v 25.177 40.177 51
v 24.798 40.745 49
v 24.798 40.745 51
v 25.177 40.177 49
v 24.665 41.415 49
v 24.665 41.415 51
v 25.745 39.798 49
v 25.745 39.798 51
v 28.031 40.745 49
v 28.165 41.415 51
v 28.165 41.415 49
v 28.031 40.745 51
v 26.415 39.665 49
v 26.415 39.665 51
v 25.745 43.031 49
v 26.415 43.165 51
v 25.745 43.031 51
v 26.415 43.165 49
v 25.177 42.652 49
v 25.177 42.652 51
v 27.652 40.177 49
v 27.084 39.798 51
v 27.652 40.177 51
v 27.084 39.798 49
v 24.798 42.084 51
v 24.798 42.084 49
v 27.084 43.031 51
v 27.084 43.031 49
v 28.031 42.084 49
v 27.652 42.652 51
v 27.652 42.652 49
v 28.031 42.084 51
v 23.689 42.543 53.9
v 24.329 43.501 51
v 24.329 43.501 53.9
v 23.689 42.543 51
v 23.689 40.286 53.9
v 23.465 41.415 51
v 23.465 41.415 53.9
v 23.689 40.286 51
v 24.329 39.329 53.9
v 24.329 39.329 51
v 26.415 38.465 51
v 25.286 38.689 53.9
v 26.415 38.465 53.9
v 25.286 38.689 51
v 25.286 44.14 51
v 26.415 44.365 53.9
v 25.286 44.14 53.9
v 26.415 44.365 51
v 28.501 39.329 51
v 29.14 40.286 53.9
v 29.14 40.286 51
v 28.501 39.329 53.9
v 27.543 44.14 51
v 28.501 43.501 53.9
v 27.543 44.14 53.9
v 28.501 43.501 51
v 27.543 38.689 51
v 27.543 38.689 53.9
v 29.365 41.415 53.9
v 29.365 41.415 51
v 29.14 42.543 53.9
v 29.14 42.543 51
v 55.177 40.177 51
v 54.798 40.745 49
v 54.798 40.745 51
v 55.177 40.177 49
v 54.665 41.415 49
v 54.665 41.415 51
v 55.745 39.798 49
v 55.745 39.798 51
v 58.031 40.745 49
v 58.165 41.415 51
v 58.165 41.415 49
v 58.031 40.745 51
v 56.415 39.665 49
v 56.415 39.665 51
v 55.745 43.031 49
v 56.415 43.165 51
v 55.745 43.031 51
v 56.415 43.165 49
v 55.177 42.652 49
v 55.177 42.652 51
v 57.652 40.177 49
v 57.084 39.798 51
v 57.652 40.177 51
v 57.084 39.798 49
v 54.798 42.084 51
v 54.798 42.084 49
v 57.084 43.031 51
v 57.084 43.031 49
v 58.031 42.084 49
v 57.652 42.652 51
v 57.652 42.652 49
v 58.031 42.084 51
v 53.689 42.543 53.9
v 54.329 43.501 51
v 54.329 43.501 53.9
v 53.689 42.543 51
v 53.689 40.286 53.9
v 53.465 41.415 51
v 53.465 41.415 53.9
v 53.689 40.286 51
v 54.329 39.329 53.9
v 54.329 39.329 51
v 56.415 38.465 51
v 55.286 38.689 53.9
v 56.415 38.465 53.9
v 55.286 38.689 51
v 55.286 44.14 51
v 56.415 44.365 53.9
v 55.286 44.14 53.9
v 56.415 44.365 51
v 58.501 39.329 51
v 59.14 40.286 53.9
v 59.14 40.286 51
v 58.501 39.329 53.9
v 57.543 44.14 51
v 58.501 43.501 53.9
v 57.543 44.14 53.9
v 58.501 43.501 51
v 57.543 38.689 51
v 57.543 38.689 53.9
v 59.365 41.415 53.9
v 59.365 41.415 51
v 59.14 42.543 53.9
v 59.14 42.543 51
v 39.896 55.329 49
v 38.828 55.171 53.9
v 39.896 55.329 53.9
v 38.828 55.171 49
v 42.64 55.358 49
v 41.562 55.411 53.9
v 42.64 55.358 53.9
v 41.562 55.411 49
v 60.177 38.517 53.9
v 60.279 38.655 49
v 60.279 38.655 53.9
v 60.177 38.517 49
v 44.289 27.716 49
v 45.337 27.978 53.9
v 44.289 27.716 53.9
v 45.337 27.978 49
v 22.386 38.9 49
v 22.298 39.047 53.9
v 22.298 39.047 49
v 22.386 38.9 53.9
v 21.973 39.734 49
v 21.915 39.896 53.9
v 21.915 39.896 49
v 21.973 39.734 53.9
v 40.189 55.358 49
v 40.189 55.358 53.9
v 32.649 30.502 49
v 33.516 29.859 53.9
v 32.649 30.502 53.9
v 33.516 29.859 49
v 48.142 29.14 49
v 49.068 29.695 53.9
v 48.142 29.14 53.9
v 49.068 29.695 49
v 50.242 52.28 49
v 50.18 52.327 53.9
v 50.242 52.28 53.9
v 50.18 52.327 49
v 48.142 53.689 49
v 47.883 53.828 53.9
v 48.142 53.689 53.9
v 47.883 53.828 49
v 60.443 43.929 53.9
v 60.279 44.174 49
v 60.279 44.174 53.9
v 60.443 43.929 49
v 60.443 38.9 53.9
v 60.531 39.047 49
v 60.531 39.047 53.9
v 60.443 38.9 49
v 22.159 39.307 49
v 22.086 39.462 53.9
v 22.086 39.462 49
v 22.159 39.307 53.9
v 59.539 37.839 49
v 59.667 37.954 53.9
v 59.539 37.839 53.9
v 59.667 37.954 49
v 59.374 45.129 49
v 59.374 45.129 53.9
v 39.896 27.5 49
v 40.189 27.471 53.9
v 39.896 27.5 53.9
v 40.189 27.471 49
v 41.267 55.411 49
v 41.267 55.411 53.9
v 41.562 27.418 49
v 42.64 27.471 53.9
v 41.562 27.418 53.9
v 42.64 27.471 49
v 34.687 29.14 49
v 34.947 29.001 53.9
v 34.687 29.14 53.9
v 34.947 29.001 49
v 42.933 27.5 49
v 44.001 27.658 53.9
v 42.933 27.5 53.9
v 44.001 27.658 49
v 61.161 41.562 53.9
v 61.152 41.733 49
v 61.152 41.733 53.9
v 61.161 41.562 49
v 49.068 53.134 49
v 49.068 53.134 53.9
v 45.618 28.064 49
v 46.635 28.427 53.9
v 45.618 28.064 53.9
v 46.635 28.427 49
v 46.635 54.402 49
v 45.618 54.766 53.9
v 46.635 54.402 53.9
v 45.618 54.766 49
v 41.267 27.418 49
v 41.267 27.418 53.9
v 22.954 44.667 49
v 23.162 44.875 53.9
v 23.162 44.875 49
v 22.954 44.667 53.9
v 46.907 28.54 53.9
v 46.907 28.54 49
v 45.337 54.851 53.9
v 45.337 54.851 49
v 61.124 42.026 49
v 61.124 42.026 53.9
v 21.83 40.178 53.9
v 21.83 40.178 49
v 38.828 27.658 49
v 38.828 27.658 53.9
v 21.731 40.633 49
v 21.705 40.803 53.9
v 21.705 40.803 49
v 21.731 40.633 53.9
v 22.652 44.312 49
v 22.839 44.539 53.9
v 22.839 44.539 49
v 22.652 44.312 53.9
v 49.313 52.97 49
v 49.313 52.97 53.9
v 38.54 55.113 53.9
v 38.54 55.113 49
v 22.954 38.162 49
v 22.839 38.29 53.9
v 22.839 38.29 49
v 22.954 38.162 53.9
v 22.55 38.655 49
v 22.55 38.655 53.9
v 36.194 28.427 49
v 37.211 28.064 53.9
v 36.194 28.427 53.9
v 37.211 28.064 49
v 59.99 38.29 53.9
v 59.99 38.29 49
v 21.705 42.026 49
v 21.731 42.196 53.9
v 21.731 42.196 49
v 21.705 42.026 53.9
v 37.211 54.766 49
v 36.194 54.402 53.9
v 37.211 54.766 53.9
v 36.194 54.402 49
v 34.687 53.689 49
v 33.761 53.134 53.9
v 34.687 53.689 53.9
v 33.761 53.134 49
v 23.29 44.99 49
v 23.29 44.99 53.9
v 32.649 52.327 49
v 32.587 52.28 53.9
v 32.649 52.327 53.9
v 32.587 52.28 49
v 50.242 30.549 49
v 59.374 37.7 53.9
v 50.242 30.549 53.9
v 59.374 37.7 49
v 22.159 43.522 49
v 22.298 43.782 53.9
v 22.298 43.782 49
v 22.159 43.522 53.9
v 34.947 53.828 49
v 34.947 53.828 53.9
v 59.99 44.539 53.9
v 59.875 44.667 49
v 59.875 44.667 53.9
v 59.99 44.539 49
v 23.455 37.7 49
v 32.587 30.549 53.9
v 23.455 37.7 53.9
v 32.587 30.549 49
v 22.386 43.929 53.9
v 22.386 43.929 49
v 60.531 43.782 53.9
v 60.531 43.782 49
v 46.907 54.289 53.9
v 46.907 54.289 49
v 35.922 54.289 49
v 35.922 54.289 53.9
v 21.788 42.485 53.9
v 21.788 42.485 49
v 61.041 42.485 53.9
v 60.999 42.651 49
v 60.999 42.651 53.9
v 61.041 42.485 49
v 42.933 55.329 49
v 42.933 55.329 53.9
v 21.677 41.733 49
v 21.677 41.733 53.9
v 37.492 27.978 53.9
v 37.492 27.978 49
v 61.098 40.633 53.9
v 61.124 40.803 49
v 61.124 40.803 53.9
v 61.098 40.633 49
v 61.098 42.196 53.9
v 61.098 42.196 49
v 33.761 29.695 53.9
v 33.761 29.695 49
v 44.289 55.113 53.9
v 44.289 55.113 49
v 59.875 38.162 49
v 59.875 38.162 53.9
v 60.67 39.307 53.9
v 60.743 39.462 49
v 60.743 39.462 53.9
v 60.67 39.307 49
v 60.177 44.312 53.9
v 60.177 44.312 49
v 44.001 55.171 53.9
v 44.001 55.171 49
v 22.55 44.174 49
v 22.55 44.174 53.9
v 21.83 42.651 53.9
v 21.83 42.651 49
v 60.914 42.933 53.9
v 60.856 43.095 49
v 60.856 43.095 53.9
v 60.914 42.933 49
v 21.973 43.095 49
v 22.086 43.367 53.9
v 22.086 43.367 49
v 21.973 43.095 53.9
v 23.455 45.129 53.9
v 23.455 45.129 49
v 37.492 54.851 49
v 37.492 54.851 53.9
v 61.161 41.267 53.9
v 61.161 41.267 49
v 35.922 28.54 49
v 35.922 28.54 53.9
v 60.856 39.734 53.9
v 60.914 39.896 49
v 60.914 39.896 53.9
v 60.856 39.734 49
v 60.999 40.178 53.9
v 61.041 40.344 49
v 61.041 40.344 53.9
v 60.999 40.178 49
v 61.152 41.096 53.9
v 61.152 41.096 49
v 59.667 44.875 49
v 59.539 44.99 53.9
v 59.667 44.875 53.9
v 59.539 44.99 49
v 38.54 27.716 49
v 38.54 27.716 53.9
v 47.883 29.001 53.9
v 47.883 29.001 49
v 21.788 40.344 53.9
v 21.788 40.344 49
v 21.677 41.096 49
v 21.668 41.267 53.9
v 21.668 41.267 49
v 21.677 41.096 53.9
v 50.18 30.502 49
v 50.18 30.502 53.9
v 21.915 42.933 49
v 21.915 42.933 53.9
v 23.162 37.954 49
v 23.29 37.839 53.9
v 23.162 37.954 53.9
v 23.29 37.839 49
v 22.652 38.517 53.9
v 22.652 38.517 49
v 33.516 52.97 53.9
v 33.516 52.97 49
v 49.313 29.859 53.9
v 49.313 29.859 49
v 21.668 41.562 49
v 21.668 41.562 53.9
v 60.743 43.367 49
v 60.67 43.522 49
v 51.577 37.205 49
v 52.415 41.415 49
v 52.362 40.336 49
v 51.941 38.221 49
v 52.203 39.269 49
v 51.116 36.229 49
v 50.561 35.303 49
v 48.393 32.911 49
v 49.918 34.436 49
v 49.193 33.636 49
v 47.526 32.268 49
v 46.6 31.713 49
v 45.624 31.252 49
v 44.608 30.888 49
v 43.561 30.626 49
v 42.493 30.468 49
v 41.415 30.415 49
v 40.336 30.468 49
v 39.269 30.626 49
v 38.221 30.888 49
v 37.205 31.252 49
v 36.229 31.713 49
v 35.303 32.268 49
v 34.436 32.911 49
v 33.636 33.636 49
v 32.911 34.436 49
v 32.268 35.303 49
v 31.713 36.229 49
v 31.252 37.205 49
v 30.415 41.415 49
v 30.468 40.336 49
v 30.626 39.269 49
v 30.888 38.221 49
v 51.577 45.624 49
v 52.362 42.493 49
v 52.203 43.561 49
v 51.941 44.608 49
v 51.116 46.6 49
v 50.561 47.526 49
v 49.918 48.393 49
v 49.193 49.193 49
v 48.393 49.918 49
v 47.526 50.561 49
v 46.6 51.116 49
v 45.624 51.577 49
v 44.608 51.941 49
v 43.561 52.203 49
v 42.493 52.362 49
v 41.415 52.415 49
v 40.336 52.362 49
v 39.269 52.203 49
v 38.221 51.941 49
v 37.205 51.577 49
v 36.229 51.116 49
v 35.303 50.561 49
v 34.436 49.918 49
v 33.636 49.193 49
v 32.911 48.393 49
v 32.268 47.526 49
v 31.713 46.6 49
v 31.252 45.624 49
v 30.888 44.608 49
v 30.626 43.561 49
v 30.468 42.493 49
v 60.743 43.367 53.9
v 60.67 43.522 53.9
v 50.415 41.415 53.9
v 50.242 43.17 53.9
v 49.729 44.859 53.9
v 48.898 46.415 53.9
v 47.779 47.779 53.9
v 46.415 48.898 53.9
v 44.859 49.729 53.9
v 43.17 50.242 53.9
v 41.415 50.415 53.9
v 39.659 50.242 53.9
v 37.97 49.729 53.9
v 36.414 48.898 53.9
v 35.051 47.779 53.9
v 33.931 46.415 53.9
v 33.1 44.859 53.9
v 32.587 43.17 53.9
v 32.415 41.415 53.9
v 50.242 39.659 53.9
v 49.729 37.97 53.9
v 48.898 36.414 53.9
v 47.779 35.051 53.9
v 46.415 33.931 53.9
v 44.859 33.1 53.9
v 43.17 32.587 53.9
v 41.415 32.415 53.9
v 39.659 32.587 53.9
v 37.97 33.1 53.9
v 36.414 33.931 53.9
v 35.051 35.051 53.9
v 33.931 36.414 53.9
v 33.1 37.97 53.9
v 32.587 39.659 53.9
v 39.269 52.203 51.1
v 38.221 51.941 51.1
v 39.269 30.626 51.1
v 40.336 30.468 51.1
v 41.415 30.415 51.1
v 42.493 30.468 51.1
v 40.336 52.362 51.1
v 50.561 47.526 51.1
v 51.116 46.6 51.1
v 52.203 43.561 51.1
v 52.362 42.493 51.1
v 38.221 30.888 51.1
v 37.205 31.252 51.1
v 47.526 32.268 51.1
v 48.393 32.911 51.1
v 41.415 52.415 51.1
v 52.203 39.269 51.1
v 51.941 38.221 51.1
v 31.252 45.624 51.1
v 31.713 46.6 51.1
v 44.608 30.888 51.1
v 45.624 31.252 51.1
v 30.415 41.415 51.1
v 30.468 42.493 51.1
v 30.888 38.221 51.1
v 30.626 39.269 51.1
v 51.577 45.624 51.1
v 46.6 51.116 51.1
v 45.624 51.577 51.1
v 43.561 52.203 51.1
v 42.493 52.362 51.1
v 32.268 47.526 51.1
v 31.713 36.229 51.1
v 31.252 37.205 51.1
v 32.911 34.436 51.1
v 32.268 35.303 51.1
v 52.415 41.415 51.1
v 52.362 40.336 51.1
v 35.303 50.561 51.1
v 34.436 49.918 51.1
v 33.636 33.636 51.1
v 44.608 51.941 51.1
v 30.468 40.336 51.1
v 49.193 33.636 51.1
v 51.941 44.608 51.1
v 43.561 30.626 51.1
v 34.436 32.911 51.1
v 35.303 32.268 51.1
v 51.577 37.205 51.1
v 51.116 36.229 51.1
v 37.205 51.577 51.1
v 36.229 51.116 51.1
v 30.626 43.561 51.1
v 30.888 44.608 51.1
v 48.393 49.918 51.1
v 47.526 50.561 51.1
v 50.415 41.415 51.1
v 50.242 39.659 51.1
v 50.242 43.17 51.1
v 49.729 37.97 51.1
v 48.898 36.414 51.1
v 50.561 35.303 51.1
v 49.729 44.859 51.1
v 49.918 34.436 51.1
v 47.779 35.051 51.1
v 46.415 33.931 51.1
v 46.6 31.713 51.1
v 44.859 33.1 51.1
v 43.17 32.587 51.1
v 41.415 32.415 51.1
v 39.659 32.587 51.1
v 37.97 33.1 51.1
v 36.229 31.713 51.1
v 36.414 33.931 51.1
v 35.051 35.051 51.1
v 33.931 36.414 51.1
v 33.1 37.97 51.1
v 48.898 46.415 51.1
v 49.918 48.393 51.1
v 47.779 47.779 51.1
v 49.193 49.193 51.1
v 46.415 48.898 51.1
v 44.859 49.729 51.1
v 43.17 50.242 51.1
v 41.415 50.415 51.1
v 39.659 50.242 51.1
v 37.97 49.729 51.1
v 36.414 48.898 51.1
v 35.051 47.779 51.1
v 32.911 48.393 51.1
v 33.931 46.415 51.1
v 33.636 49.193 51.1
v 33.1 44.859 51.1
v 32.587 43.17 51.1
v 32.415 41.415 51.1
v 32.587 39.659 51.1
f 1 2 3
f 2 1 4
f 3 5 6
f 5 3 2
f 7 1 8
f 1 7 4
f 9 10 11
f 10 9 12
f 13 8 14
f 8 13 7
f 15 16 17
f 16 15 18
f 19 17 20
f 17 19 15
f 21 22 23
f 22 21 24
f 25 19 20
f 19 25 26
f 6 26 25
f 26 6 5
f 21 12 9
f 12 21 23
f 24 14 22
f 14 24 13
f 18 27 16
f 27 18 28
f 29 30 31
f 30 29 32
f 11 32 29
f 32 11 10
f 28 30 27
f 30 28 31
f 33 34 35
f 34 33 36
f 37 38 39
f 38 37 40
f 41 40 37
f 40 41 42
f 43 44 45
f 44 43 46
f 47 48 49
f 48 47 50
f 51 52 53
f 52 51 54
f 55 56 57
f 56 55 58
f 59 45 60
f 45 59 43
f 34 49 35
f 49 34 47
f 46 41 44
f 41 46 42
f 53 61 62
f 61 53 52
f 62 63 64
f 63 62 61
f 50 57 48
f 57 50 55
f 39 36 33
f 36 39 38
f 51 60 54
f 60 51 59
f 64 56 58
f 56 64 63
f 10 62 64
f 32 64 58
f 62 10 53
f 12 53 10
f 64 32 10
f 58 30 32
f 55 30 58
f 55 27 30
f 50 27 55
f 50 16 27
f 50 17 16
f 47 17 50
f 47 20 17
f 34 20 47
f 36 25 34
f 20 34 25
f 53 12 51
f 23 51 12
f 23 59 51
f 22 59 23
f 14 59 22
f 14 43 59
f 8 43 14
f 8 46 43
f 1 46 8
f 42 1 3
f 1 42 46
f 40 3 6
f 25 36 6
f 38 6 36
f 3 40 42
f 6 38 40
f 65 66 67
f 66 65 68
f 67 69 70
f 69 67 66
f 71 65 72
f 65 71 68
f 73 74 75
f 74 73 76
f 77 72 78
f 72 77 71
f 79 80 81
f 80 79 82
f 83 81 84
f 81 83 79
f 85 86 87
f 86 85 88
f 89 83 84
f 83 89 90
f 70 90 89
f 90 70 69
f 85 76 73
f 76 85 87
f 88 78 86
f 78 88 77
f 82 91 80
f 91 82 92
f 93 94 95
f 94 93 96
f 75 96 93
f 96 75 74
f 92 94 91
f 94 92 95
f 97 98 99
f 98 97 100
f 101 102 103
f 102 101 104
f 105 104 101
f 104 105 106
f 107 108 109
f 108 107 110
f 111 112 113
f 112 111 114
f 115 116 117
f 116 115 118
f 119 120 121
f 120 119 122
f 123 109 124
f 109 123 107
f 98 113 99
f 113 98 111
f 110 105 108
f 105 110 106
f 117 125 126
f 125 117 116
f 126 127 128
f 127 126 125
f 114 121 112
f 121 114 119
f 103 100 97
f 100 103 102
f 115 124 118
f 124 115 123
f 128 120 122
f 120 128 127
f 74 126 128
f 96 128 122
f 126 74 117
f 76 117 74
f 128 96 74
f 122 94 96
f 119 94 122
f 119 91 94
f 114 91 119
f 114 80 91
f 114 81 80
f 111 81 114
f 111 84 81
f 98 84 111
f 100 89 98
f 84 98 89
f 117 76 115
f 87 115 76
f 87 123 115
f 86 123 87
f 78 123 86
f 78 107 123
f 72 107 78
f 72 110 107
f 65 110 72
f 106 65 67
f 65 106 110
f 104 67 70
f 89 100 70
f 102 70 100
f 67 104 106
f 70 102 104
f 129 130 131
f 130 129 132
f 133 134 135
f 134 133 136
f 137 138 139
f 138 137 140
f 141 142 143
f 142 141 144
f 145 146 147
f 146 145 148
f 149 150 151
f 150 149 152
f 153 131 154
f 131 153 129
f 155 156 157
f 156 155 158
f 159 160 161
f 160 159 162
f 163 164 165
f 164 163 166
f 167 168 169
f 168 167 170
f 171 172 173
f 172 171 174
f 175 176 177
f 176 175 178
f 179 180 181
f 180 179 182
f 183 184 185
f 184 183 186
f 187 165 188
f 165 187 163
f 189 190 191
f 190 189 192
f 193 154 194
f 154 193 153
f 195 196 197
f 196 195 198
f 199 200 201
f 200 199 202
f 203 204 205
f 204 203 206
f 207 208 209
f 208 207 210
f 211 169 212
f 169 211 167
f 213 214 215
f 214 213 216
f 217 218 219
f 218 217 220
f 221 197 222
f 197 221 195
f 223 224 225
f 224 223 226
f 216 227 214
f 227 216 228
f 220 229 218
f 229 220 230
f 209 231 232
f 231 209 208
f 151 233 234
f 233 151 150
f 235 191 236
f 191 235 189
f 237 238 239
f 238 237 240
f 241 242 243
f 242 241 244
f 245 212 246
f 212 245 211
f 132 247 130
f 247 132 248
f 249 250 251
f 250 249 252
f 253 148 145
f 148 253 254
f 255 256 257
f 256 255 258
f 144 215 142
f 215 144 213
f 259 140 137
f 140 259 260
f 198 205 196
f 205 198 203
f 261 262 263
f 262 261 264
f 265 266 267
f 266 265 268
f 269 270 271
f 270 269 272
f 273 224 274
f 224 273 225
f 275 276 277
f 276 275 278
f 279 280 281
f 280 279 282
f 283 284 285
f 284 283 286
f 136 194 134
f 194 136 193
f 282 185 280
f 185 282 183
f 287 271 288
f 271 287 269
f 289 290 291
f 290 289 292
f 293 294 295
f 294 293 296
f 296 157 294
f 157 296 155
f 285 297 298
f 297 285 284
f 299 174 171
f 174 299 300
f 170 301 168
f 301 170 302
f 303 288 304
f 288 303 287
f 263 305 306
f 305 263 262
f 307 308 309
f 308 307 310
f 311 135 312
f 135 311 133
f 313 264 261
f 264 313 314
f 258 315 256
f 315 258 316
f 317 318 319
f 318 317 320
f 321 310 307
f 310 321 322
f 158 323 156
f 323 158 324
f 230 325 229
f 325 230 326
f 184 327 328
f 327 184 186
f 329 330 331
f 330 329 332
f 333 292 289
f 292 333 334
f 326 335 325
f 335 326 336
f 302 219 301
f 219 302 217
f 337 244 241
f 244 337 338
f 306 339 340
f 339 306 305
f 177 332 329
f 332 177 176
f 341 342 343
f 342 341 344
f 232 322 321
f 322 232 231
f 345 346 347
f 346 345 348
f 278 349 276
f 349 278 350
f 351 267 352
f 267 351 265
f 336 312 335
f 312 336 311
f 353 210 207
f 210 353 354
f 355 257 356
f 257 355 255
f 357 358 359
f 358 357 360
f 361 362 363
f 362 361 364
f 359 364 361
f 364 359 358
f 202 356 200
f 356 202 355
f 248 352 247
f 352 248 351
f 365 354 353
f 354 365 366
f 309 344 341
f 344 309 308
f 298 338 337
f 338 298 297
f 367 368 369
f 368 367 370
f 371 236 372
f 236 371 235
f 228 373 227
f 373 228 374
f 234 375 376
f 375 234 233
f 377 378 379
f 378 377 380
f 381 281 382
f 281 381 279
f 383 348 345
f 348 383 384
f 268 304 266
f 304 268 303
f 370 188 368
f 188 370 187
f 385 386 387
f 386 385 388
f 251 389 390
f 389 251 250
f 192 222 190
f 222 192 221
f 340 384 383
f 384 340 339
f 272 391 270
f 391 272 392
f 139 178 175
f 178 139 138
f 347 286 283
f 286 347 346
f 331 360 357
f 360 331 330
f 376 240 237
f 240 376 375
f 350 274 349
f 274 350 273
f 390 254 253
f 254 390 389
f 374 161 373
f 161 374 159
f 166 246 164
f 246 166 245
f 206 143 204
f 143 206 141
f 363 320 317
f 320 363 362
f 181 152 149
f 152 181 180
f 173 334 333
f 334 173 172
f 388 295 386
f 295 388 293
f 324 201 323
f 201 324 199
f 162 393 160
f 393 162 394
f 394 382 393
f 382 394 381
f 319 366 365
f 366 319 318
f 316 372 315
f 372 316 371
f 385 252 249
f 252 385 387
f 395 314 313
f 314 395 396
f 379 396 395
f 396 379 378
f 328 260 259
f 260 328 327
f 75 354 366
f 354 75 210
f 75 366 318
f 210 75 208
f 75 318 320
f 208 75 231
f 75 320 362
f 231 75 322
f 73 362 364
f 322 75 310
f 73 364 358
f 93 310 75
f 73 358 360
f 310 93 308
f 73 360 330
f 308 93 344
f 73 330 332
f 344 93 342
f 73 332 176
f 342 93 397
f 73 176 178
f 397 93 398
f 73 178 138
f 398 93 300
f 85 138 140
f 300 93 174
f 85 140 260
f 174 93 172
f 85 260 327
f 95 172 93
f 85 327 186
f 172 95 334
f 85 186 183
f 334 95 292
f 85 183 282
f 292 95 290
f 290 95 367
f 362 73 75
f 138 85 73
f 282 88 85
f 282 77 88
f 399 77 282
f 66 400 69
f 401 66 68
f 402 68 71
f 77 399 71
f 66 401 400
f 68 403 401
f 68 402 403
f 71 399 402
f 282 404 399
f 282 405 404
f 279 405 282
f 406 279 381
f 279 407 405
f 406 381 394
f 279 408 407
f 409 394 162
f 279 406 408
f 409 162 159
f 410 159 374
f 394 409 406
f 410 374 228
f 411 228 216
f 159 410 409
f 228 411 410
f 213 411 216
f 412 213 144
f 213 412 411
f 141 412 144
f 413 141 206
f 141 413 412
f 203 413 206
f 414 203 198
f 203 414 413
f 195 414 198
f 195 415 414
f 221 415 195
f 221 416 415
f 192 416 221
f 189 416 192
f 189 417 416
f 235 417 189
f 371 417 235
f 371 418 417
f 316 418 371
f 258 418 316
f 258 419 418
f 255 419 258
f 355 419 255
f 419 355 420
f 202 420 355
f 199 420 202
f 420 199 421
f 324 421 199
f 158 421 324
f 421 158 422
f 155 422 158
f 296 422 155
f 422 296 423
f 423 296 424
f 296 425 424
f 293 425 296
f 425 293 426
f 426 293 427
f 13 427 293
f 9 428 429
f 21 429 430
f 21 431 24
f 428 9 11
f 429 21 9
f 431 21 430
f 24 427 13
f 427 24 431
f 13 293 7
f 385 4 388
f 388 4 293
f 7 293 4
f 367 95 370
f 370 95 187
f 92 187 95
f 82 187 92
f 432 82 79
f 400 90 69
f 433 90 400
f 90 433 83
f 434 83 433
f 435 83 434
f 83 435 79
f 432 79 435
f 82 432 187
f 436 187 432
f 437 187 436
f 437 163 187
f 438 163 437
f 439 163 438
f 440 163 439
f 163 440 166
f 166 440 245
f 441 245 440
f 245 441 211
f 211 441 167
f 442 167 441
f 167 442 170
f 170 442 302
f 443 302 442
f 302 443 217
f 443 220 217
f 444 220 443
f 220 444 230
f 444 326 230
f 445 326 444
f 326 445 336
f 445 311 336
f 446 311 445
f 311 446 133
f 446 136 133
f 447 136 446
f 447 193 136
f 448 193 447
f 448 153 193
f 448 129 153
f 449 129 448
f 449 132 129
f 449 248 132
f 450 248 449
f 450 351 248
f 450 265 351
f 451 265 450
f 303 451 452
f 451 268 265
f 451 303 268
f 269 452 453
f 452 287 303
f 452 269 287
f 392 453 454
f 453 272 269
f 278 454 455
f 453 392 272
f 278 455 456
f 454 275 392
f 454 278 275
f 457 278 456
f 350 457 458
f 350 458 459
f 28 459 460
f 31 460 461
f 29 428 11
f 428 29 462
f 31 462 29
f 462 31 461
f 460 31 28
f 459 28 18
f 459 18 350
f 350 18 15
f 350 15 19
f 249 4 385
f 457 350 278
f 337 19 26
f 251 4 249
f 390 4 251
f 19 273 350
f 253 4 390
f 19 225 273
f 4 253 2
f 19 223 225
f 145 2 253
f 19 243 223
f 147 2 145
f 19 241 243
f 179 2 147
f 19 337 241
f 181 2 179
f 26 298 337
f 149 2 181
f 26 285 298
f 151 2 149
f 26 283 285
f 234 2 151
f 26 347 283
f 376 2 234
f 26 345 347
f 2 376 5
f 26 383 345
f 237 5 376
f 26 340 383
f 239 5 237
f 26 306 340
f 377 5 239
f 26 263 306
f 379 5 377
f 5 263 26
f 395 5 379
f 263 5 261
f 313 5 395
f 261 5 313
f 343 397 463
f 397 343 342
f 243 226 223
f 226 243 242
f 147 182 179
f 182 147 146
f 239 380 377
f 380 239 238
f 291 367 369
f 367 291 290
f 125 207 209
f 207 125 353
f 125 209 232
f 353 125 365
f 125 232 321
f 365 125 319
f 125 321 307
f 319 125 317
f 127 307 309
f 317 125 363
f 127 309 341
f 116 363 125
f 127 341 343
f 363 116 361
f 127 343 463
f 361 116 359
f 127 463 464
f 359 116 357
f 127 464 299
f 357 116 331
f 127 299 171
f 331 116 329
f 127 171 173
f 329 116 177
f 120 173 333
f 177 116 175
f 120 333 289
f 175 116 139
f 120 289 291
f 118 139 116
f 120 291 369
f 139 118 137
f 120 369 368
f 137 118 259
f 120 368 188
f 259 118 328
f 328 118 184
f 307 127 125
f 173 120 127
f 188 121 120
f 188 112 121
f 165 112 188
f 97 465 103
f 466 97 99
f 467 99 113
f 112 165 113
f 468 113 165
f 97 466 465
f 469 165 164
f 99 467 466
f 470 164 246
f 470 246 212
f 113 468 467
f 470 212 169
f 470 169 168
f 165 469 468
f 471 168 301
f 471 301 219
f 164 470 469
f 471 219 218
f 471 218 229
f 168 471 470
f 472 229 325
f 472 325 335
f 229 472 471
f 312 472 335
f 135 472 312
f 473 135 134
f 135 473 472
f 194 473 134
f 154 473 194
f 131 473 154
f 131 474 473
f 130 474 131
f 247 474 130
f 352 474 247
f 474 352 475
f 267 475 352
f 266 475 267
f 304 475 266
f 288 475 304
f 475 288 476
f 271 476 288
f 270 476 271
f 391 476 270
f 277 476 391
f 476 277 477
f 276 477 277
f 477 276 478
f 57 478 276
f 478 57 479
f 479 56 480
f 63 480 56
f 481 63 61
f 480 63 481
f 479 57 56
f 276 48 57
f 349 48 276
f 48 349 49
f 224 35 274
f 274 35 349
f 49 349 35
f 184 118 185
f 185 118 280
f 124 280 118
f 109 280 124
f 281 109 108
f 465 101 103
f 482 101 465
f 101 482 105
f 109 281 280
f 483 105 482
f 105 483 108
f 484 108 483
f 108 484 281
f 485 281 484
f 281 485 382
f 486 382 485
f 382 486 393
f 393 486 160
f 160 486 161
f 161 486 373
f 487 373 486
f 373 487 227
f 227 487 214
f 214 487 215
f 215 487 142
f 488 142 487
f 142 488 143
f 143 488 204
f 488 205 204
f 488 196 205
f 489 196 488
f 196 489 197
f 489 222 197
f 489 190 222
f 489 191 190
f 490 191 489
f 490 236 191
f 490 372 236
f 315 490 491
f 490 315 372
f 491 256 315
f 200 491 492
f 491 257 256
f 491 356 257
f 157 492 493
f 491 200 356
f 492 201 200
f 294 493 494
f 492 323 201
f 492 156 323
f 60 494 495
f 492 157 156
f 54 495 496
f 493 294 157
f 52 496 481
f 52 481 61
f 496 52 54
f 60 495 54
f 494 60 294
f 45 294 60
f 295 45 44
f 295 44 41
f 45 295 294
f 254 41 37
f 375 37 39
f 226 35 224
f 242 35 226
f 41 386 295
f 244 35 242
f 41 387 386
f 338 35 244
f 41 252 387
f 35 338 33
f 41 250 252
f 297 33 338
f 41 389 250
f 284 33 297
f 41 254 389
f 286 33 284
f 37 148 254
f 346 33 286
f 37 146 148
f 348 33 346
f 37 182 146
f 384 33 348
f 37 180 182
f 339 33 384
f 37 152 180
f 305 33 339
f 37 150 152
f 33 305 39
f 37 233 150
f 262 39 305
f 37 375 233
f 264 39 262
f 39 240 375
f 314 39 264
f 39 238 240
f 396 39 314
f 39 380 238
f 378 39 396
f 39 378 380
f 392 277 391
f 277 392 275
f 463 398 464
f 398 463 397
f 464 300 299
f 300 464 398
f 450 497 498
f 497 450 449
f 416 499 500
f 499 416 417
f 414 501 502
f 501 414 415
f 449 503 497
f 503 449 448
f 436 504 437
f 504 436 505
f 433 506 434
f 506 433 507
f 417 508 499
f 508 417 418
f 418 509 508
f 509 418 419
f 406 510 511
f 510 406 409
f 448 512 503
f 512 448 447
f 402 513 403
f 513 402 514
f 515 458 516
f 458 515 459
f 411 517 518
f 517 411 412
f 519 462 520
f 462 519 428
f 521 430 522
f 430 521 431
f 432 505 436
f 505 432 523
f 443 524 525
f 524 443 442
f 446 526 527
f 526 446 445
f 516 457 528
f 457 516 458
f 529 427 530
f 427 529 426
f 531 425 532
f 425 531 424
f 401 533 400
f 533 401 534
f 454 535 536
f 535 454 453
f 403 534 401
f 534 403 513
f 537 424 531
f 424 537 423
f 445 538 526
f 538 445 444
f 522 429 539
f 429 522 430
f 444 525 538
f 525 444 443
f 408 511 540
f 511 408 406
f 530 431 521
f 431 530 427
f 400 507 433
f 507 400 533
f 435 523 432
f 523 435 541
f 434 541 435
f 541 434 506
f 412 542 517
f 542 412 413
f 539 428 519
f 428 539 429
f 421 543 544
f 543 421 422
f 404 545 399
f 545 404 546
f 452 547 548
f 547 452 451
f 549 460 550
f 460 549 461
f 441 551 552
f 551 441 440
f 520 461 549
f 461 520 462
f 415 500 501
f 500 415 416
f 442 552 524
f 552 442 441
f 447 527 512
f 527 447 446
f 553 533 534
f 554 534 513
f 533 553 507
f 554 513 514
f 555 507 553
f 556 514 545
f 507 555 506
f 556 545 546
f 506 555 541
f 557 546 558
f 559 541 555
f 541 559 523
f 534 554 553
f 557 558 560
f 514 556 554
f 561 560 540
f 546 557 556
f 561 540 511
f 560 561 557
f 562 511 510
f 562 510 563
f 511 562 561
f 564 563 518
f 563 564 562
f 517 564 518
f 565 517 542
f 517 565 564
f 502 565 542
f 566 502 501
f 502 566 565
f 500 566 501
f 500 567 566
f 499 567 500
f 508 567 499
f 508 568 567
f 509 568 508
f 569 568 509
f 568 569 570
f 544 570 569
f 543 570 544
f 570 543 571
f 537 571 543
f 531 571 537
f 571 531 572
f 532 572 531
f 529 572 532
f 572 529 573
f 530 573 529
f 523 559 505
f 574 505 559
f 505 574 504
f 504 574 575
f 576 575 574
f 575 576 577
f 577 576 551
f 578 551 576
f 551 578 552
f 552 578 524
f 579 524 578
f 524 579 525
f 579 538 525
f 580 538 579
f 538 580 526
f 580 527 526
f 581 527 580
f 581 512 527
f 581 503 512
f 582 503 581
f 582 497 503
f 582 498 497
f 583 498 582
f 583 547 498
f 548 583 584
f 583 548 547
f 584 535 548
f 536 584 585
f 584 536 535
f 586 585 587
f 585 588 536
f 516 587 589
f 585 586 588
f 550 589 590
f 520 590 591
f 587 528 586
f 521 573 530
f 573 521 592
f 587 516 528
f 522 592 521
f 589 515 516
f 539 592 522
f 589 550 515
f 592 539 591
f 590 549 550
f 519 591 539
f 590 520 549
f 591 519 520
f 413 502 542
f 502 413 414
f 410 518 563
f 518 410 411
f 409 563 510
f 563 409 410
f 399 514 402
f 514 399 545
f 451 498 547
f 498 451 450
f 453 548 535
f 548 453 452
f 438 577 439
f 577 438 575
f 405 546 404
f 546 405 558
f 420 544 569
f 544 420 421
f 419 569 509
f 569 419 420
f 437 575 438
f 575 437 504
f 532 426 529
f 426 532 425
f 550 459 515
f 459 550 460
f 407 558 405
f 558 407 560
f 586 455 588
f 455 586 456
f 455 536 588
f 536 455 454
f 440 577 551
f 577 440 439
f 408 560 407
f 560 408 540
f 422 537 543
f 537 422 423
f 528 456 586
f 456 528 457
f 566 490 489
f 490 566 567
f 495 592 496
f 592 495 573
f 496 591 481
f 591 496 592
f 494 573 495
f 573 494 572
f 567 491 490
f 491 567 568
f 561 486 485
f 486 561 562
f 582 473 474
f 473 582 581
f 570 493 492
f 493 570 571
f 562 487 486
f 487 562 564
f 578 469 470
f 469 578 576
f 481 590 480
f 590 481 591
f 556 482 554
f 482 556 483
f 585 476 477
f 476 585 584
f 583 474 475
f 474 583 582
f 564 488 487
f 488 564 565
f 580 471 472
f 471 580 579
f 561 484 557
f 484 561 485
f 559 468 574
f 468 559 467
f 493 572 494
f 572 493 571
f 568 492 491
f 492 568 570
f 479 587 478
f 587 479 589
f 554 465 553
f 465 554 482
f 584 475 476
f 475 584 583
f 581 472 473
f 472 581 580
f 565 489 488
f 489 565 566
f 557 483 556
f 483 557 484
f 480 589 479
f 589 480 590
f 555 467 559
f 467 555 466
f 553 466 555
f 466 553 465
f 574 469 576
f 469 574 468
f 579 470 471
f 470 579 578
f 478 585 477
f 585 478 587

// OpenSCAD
translate(v = [41.4145505432, 41.4145505432, 49.0000000000]) {
	rotate(a = 180, v = [0, 0, 1]) {
		union() {
			difference() {
				linear_extrude(height = 4.9000000000) {
					union() {
						difference() {
							polygon(points = [[0.1472030230, -13.9963863686], [-0.1472030230, -13.9963863686], [-1.2253915666, -13.9434183620], [-1.5183799670, -13.9145615233], [-2.5861849655, -13.7561676143], [-2.8749340819, -13.6987318440], [-3.9220719895, -13.4364374526], [-4.2038010100, -13.3509758886], [-5.2201873162, -12.9873070532], [-5.4921830363, -12.8746427370], [-6.4680293854, -12.4131017872], [-6.7276723377, -12.2743197378], [-7.6535807958, -11.7193515653], [-7.8983704767, -11.5557883298], [-8.7654240393, -10.9127375814], [-8.8278398849, -10.8651689353], [-17.9597020064, -3.7148222417], [-18.1248651118, -3.5756216694], [-18.2521137316, -3.4602902431], [-18.4602902431, -3.2521137316], [-18.5756216694, -3.1248651118], [-18.7623908878, -2.8972861608], [-18.8646944160, -2.7593458213], [-19.0282576515, -2.5145561404], [-19.1165480426, -2.3672525220], [-19.2553300920, -2.1076095697], [-19.3287570613, -1.9523612869], [-19.4414213774, -1.6803655668], [-19.4992777831, -1.5186677454], [-19.5847393471, -1.2369387249], [-19.6264680003, -1.0703486032], [-19.6839037706, -0.7815994869], [-19.7091028016, -0.6117214189], [-19.7379596403, -0.3187330186], [-19.7463863686, -0.1472030230], [-19.7463863686, 0.1472030230], [-19.7379596403, 0.3187330186], [-19.7091028016, 0.6117214189], [-19.6839037706, 0.7815994869], [-19.6264680003, 1.0703486032], [-19.5847393471, 1.2369387249], [-19.4992777831, 1.5186677454], [-19.4414213774, 1.6803655668], [-19.3287570613, 1.9523612869], [-19.2553300920, 2.1076095697], [-19.1165480426, 2.3672525220], [-19.0282576515, 2.5145561404], [-18.8646944160, 2.7593458213], [-18.7623908878, 2.8972861608], [-18.5756216694, 3.1248651118], [-18.4602902431, 3.2521137316], [-18.2521137316, 3.4602902431], [-18.1248651118, 3.5756216694], [-17.9597020064, 3.7148222417], [-8.8278398849, 10.8651689353], [-8.7654240393, 10.9127375814], [-7.8983704767, 11.5557883298], [-7.6535807958, 11.7193515653], [-6.7276723377, 12.2743197378], [-6.4680293854, 12.4131017872], [-5.4921830363, 12.8746427370], [-5.2201873162, 12.9873070532], [-4.2038010100, 13.3509758886], [-3.9220719895, 13.4364374526], [-2.8749340819, 13.6987318440], [-2.5861849655, 13.7561676143], [-1.5183799670, 13.9145615233], [-1.2253915666, 13.9434183620], [-0.1472030230, 13.9963863686], [0.1472030230, 13.9963863686], [1.2253915666, 13.9434183620], [1.5183799670, 13.9145615233], [2.5861849655, 13.7561676143], [2.8749340819, 13.6987318440], [3.9220719895, 13.4364374526], [4.2038010100, 13.3509758886], [5.2201873162, 12.9873070532], [5.4921830363, 12.8746427370], [6.4680293854, 12.4131017872], [6.7276723377, 12.2743197378], [7.6535807958, 11.7193515653], [7.8983704767, 11.5557883298], [8.7654240393, 10.9127375814], [8.8278398849, 10.8651689353], [17.9597020064, 3.7148222417], [18.1248651118, 3.5756216694], [18.2521137316, 3.4602902431], [18.4602902431, 3.2521137316], [18.5756216694, 3.1248651118], [18.7623908878, 2.8972861608], [18.8646944160, 2.7593458213], [19.0282576515, 2.5145561404], [19.1165480426, 2.3672525220], [19.2553300920, 2.1076095697], [19.3287570613, 1.9523612869], [19.4414213774, 1.6803655668], [19.4992777831, 1.5186677454], [19.5847393471, 1.2369387249], [19.6264680003, 1.0703486032], [19.6839037706, 0.7815994869], [19.7091028016, 0.6117214189], [19.7379596403, 0.3187330186], [19.7463863686, 0.1472030230], [19.7463863686, -0.1472030230], [19.7379596403, -0.3187330186], [19.7091028016, -0.6117214189], [19.6839037706, -0.7815994869], [19.6264680003, -1.0703486032], [19.5847393471, -1.2369387249], [19.4992777831, -1.5186677454], [19.4414213774, -1.6803655668], [19.3287570613, -1.9523612869], [19.2553300920, -2.1076095697], [19.1165480426, -2.3672525220], [19.0282576515, -2.5145561404], [18.8646944160, -2.7593458213], [18.7623908878, -2.8972861608], [18.5756216694, -3.1248651118], [18.4602902431, -3.2521137316], [18.2521137316, -3.4602902431], [18.1248651118, -3.5756216694], [17.9597020064, -3.7148222417], [8.8278398849, -10.8651689353], [8.7654240393, -10.9127375814], [7.8983704767, -11.5557883298], [7.6535807958, -11.7193515653], [6.7276723377, -12.2743197378], [6.4680293854, -12.4131017872], [5.4921830363, -12.8746427370], [5.2201873162, -12.9873070532], [4.2038010100, -13.3509758886], [3.9220719895, -13.4364374526], [2.8749340819, -13.6987318440], [2.5861849655, -13.7561676143], [1.5183799670, -13.9145615233], [1.2253915666, -13.9434183620], [0.1472030230, -13.9963863686]]);
						}
					}
				}
				translate(v = [0, 0, -1]) {
					linear_extrude(height = 3.1000000000) {
						union() {
							difference() {
								polygon(points = [[11.0000000000, 0.0000000000], [10.9470319934, -1.0781885436], [10.7886380844, -2.1459935422], [10.5263436931, -3.1931314498], [10.1626748576, -4.2095177560], [9.7011339078, -5.1853641051], [9.1461657353, -6.1112725632], [8.5031149870, -6.9783261258], [7.7781745931, -7.7781745931], [6.9783261258, -8.5031149870], [6.1112725632, -9.1461657353], [5.1853641051, -9.7011339078], [4.2095177560, -10.1626748576], [3.1931314498, -10.5263436931], [2.1459935422, -10.7886380844], [1.0781885436, -10.9470319934], [0.0000000000, -11.0000000000], [-1.0781885436, -10.9470319934], [-2.1459935422, -10.7886380844], [-3.1931314498, -10.5263436931], [-4.2095177560, -10.1626748576], [-5.1853641051, -9.7011339078], [-6.1112725632, -9.1461657353], [-6.9783261258, -8.5031149870], [-7.7781745931, -7.7781745931], [-8.5031149870, -6.9783261258], [-9.1461657353, -6.1112725632], [-9.7011339078, -5.1853641051], [-10.1626748576, -4.2095177560], [-10.5263436931, -3.1931314498], [-10.7886380844, -2.1459935422], [-10.9470319934, -1.0781885436], [-11.0000000000, -0.0000000000], [-10.9470319934, 1.0781885436], [-10.7886380844, 2.1459935422], [-10.5263436931, 3.1931314498], [-10.1626748576, 4.2095177560], [-9.7011339078, 5.1853641051], [-9.1461657353, 6.1112725632], [-8.5031149870, 6.9783261258], [-7.7781745931, 7.7781745931], [-6.9783261258, 8.5031149870], [-6.1112725632, 9.1461657353], [-5.1853641051, 9.7011339078], [-4.2095177560, 10.1626748576], [-3.1931314498, 10.5263436931], [-2.1459935422, 10.7886380844], [-1.0781885436, 10.9470319934], [-0.0000000000, 11.0000000000], [1.0781885436, 10.9470319934], [2.1459935422, 10.7886380844], [3.1931314498, 10.5263436931], [4.2095177560, 10.1626748576], [5.1853641051, 9.7011339078], [6.1112725632, 9.1461657353], [6.9783261258, 8.5031149870], [7.7781745931, 7.7781745931], [8.5031149870, 6.9783261258], [9.1461657353, 6.1112725632], [9.7011339078, 5.1853641051], [10.1626748576, 4.2095177560], [10.5263436931, 3.1931314498], [10.7886380844, 2.1459935422], [10.9470319934, 1.0781885436], [11.0000000000, 0.0000000000]]);
							}
						}
					}
				}
				translate(v = [0, 0, -1]) {
					cylinder($fn = 32, h = 6.9000000000, r = 9);
				}
				translate(v = [15, 0, -1]) {
					union() {
						cylinder($fn = 16, h = 6.9000000000, r = 1.7500000000);
						translate(v = [0, 0, 3]) {
							cylinder($fn = 16, h = 4.9000000000, r = 2.9500000000);
						}
					}
				}
				translate(v = [-15, 0, -1]) {
					union() {
						cylinder($fn = 16, h = 6.9000000000, r = 1.7500000000);
						translate(v = [0, 0, 3]) {
							cylinder($fn = 16, h = 4.9000000000, r = 2.9500000000);
						}
					}
				}
			}
		}
		union() {
			difference() {
				linear_extrude(height = 4.9000000000) {
					union() {
						difference() {
							polygon(points = [[0.1472030230, -13.9963863686], [-0.1472030230, -13.9963863686], [-1.2253915666, -13.9434183620], [-1.5183799670, -13.9145615233], [-2.5861849655, -13.7561676143], [-2.8749340819, -13.6987318440], [-3.9220719895, -13.4364374526], [-4.2038010100, -13.3509758886], [-5.2201873162, -12.9873070532], [-5.4921830363, -12.8746427370], [-6.4680293854, -12.4131017872], [-6.7276723377, -12.2743197378], [-7.6535807958, -11.7193515653], [-7.8983704767, -11.5557883298], [-8.7654240393, -10.9127375814], [-8.8278398849, -10.8651689353], [-17.9597020064, -3.7148222417], [-18.1248651118, -3.5756216694], [-18.2521137316, -3.4602902431], [-18.4602902431, -3.2521137316], [-18.5756216694, -3.1248651118], [-18.7623908878, -2.8972861608], [-18.8646944160, -2.7593458213], [-19.0282576515, -2.5145561404], [-19.1165480426, -2.3672525220], [-19.2553300920, -2.1076095697], [-19.3287570613, -1.9523612869], [-19.4414213774, -1.6803655668], [-19.4992777831, -1.5186677454], [-19.5847393471, -1.2369387249], [-19.6264680003, -1.0703486032], [-19.6839037706, -0.7815994869], [-19.7091028016, -0.6117214189], [-19.7379596403, -0.3187330186], [-19.7463863686, -0.1472030230], [-19.7463863686, 0.1472030230], [-19.7379596403, 0.3187330186], [-19.7091028016, 0.6117214189], [-19.6839037706, 0.7815994869], [-19.6264680003, 1.0703486032], [-19.5847393471, 1.2369387249], [-19.4992777831, 1.5186677454], [-19.4414213774, 1.6803655668], [-19.3287570613, 1.9523612869], [-19.2553300920, 2.1076095697], [-19.1165480426, 2.3672525220], [-19.0282576515, 2.5145561404], [-18.8646944160, 2.7593458213], [-18.7623908878, 2.8972861608], [-18.5756216694, 3.1248651118], [-18.4602902431, 3.2521137316], [-18.2521137316, 3.4602902431], [-18.1248651118, 3.5756216694], [-17.9597020064, 3.7148222417], [-8.8278398849, 10.8651689353], [-8.7654240393, 10.9127375814], [-7.8983704767, 11.5557883298], [-7.6535807958, 11.7193515653], [-6.7276723377, 12.2743197378], [-6.4680293854, 12.4131017872], [-5.4921830363, 12.8746427370], [-5.2201873162, 12.9873070532], [-4.2038010100, 13.3509758886], [-3.9220719895, 13.4364374526], [-2.8749340819, 13.6987318440], [-2.5861849655, 13.7561676143], [-1.5183799670, 13.9145615233], [-1.2253915666, 13.9434183620], [-0.1472030230, 13.9963863686], [0.1472030230, 13.9963863686], [1.2253915666, 13.9434183620], [1.5183799670, 13.9145615233], [2.5861849655, 13.7561676143], [2.8749340819, 13.6987318440], [3.9220719895, 13.4364374526], [4.2038010100, 13.3509758886], [5.2201873162, 12.9873070532], [5.4921830363, 12.8746427370], [6.4680293854, 12.4131017872], [6.7276723377, 12.2743197378], [7.6535807958, 11.7193515653], [7.8983704767, 11.5557883298], [8.7654240393, 10.9127375814], [8.8278398849, 10.8651689353], [17.9597020064, 3.7148222417], [18.1248651118, 3.5756216694], [18.2521137316, 3.4602902431], [18.4602902431, 3.2521137316], [18.5756216694, 3.1248651118], [18.7623908878, 2.8972861608], [18.8646944160, 2.7593458213], [19.0282576515, 2.5145561404], [19.1165480426, 2.3672525220], [19.2553300920, 2.1076095697], [19.3287570613, 1.9523612869], [19.4414213774, 1.6803655668], [19.4992777831, 1.5186677454], [19.5847393471, 1.2369387249], [19.6264680003, 1.0703486032], [19.6839037706, 0.7815994869], [19.7091028016, 0.6117214189], [19.7379596403, 0.3187330186], [19.7463863686, 0.1472030230], [19.7463863686, -0.1472030230], [19.7379596403, -0.3187330186], [19.7091028016, -0.6117214189], [19.6839037706, -0.7815994869], [19.6264680003, -1.0703486032], [19.5847393471, -1.2369387249], [19.4992777831, -1.5186677454], [19.4414213774, -1.6803655668], [19.3287570613, -1.9523612869], [19.2553300920, -2.1076095697], [19.1165480426, -2.3672525220], [19.0282576515, -2.5145561404], [18.8646944160, -2.7593458213], [18.7623908878, -2.8972861608], [18.5756216694, -3.1248651118], [18.4602902431, -3.2521137316], [18.2521137316, -3.4602902431], [18.1248651118, -3.5756216694], [17.9597020064, -3.7148222417], [8.8278398849, -10.8651689353], [8.7654240393, -10.9127375814], [7.8983704767, -11.5557883298], [7.6535807958, -11.7193515653], [6.7276723377, -12.2743197378], [6.4680293854, -12.4131017872], [5.4921830363, -12.8746427370], [5.2201873162, -12.9873070532], [4.2038010100, -13.3509758886], [3.9220719895, -13.4364374526], [2.8749340819, -13.6987318440], [2.5861849655, -13.7561676143], [1.5183799670, -13.9145615233], [1.2253915666, -13.9434183620], [0.1472030230, -13.9963863686]]);
						}
					}
				}
				translate(v = [0, 0, -1]) {
					linear_extrude(height = 3.1000000000) {
						union() {
							difference() {
								polygon(points = [[11.0000000000, 0.0000000000], [10.9470319934, -1.0781885436], [10.7886380844, -2.1459935422], [10.5263436931, -3.1931314498], [10.1626748576, -4.2095177560], [9.7011339078, -5.1853641051], [9.1461657353, -6.1112725632], [8.5031149870, -6.9783261258], [7.7781745931, -7.7781745931], [6.9783261258, -8.5031149870], [6.1112725632, -9.1461657353], [5.1853641051, -9.7011339078], [4.2095177560, -10.1626748576], [3.1931314498, -10.5263436931], [2.1459935422, -10.7886380844], [1.0781885436, -10.9470319934], [0.0000000000, -11.0000000000], [-1.0781885436, -10.9470319934], [-2.1459935422, -10.7886380844], [-3.1931314498, -10.5263436931], [-4.2095177560, -10.1626748576], [-5.1853641051, -9.7011339078], [-6.1112725632, -9.1461657353], [-6.9783261258, -8.5031149870], [-7.7781745931, -7.7781745931], [-8.5031149870, -6.9783261258], [-9.1461657353, -6.1112725632], [-9.7011339078, -5.1853641051], [-10.1626748576, -4.2095177560], [-10.5263436931, -3.1931314498], [-10.7886380844, -2.1459935422], [-10.9470319934, -1.0781885436], [-11.0000000000, -0.0000000000], [-10.9470319934, 1.0781885436], [-10.7886380844, 2.1459935422], [-10.5263436931, 3.1931314498], [-10.1626748576, 4.2095177560], [-9.7011339078, 5.1853641051], [-9.1461657353, 6.1112725632], [-8.5031149870, 6.9783261258], [-7.7781745931, 7.7781745931], [-6.9783261258, 8.5031149870], [-6.1112725632, 9.1461657353], [-5.1853641051, 9.7011339078], [-4.2095177560, 10.1626748576], [-3.1931314498, 10.5263436931], [-2.1459935422, 10.7886380844], [-1.0781885436, 10.9470319934], [-0.0000000000, 11.0000000000], [1.0781885436, 10.9470319934], [2.1459935422, 10.7886380844], [3.1931314498, 10.5263436931], [4.2095177560, 10.1626748576], [5.1853641051, 9.7011339078], [6.1112725632, 9.1461657353], [6.9783261258, 8.5031149870], [7.7781745931, 7.7781745931], [8.5031149870, 6.9783261258], [9.1461657353, 6.1112725632], [9.7011339078, 5.1853641051], [10.1626748576, 4.2095177560], [10.5263436931, 3.1931314498], [10.7886380844, 2.1459935422], [10.9470319934, 1.0781885436], [11.0000000000, 0.0000000000]]);
							}
						}
					}
				}
				translate(v = [0, 0, -1]) {
					cylinder($fn = 32, h = 6.9000000000, r = 9);
				}
				translate(v = [15, 0, -1]) {
					union() {
						cylinder($fn = 16, h = 6.9000000000, r = 1.7500000000);
						translate(v = [0, 0, 3]) {
							cylinder($fn = 16, h = 4.9000000000, r = 2.9500000000);
						}
					}
				}
				translate(v = [-15, 0, -1]) {
					union() {
						cylinder($fn = 16, h = 6.9000000000, r = 1.7500000000);
						translate(v = [0, 0, 3]) {
							cylinder($fn = 16, h = 4.9000000000, r = 2.9500000000);
						}
					}
				}
			}
		}
	}
	rotate(a = 180, v = [0, 0, 1]) {
		union() {
			difference() {
				linear_extrude(height = 4.9000000000) {
					union() {
						difference() {
							polygon(points = [[0.1472030230, -13.9963863686], [-0.1472030230, -13.9963863686], [-1.2253915666, -13.9434183620], [-1.5183799670, -13.9145615233], [-2.5861849655, -13.7561676143], [-2.8749340819, -13.6987318440], [-3.9220719895, -13.4364374526], [-4.2038010100, -13.3509758886], [-5.2201873162, -12.9873070532], [-5.4921830363, -12.8746427370], [-6.4680293854, -12.4131017872], [-6.7276723377, -12.2743197378], [-7.6535807958, -11.7193515653], [-7.8983704767, -11.5557883298], [-8.7654240393, -10.9127375814], [-8.8278398849, -10.8651689353], [-17.9597020064, -3.7148222417], [-18.1248651118, -3.5756216694], [-18.2521137316, -3.4602902431], [-18.4602902431, -3.2521137316], [-18.5756216694, -3.1248651118], [-18.7623908878, -2.8972861608], [-18.8646944160, -2.7593458213], [-19.0282576515, -2.5145561404], [-19.1165480426, -2.3672525220], [-19.2553300920, -2.1076095697], [-19.3287570613, -1.9523612869], [-19.4414213774, -1.6803655668], [-19.4992777831, -1.5186677454], [-19.5847393471, -1.2369387249], [-19.6264680003, -1.0703486032], [-19.6839037706, -0.7815994869], [-19.7091028016, -0.6117214189], [-19.7379596403, -0.3187330186], [-19.7463863686, -0.1472030230], [-19.7463863686, 0.1472030230], [-19.7379596403, 0.3187330186], [-19.7091028016, 0.6117214189], [-19.6839037706, 0.7815994869], [-19.6264680003, 1.0703486032], [-19.5847393471, 1.2369387249], [-19.4992777831, 1.5186677454], [-19.4414213774, 1.6803655668], [-19.3287570613, 1.9523612869], [-19.2553300920, 2.1076095697], [-19.1165480426, 2.3672525220], [-19.0282576515, 2.5145561404], [-18.8646944160, 2.7593458213], [-18.7623908878, 2.8972861608], [-18.5756216694, 3.1248651118], [-18.4602902431, 3.2521137316], [-18.2521137316, 3.4602902431], [-18.1248651118, 3.5756216694], [-17.9597020064, 3.7148222417], [-8.8278398849, 10.8651689353], [-8.7654240393, 10.9127375814], [-7.8983704767, 11.5557883298], [-7.6535807958, 11.7193515653], [-6.7276723377, 12.2743197378], [-6.4680293854, 12.4131017872], [-5.4921830363, 12.8746427370], [-5.2201873162, 12.9873070532], [-4.2038010100, 13.3509758886], [-3.9220719895, 13.4364374526], [-2.8749340819, 13.6987318440], [-2.5861849655, 13.7561676143], [-1.5183799670, 13.9145615233], [-1.2253915666, 13.9434183620], [-0.1472030230, 13.9963863686], [0.1472030230, 13.9963863686], [1.2253915666, 13.9434183620], [1.5183799670, 13.9145615233], [2.5861849655, 13.7561676143], [2.8749340819, 13.6987318440], [3.9220719895, 13.4364374526], [4.2038010100, 13.3509758886], [5.2201873162, 12.9873070532], [5.4921830363, 12.8746427370], [6.4680293854, 12.4131017872], [6.7276723377, 12.2743197378], [7.6535807958, 11.7193515653], [7.8983704767, 11.5557883298], [8.7654240393, 10.9127375814], [8.8278398849, 10.8651689353], [17.9597020064, 3.7148222417], [18.1248651118, 3.5756216694], [18.2521137316, 3.4602902431], [18.4602902431, 3.2521137316], [18.5756216694, 3.1248651118], [18.7623908878, 2.8972861608], [18.8646944160, 2.7593458213], [19.0282576515, 2.5145561404], [19.1165480426, 2.3672525220], [19.2553300920, 2.1076095697], [19.3287570613, 1.9523612869], [19.4414213774, 1.6803655668], [19.4992777831, 1.5186677454], [19.5847393471, 1.2369387249], [19.6264680003, 1.0703486032], [19.6839037706, 0.7815994869], [19.7091028016, 0.6117214189], [19.7379596403, 0.3187330186], [19.7463863686, 0.1472030230], [19.7463863686, -0.1472030230], [19.7379596403, -0.3187330186], [19.7091028016, -0.6117214189], [19.6839037706, -0.7815994869], [19.6264680003, -1.0703486032], [19.5847393471, -1.2369387249], [19.4992777831, -1.5186677454], [19.4414213774, -1.6803655668], [19.3287570613, -1.9523612869], [19.2553300920, -2.1076095697], [19.1165480426, -2.3672525220], [19.0282576515, -2.5145561404], [18.8646944160, -2.7593458213], [18.7623908878, -2.8972861608], [18.5756216694, -3.1248651118], [18.4602902431, -3.2521137316], [18.2521137316, -3.4602902431], [18.1248651118, -3.5756216694], [17.9597020064, -3.7148222417], [8.8278398849, -10.8651689353], [8.7654240393, -10.9127375814], [7.8983704767, -11.5557883298], [7.6535807958, -11.7193515653], [6.7276723377, -12.2743197378], [6.4680293854, -12.4131017872], [5.4921830363, -12.8746427370], [5.2201873162, -12.9873070532], [4.2038010100, -13.3509758886], [3.9220719895, -13.4364374526], [2.8749340819, -13.6987318440], [2.5861849655, -13.7561676143], [1.5183799670, -13.9145615233], [1.2253915666, -13.9434183620], [0.1472030230, -13.9963863686]]);
						}
					}
				}
				translate(v = [0, 0, -1]) {
					linear_extrude(height = 3.1000000000) {
						union() {
							difference() {
								polygon(points = [[11.0000000000, 0.0000000000], [10.9470319934, -1.0781885436], [10.7886380844, -2.1459935422], [10.5263436931, -3.1931314498], [10.1626748576, -4.2095177560], [9.7011339078, -5.1853641051], [9.1461657353, -6.1112725632], [8.5031149870, -6.9783261258], [7.7781745931, -7.7781745931], [6.9783261258, -8.5031149870], [6.1112725632, -9.1461657353], [5.1853641051, -9.7011339078], [4.2095177560, -10.1626748576], [3.1931314498, -10.5263436931], [2.1459935422, -10.7886380844], [1.0781885436, -10.9470319934], [0.0000000000, -11.0000000000], [-1.0781885436, -10.9470319934], [-2.1459935422, -10.7886380844], [-3.1931314498, -10.5263436931], [-4.2095177560, -10.1626748576], [-5.1853641051, -9.7011339078], [-6.1112725632, -9.1461657353], [-6.9783261258, -8.5031149870], [-7.7781745931, -7.7781745931], [-8.5031149870, -6.9783261258], [-9.1461657353, -6.1112725632], [-9.7011339078, -5.1853641051], [-10.1626748576, -4.2095177560], [-10.5263436931, -3.1931314498], [-10.7886380844, -2.1459935422], [-10.9470319934, -1.0781885436], [-11.0000000000, -0.0000000000], [-10.9470319934, 1.0781885436], [-10.7886380844, 2.1459935422], [-10.5263436931, 3.1931314498], [-10.1626748576, 4.2095177560], [-9.7011339078, 5.1853641051], [-9.1461657353, 6.1112725632], [-8.5031149870, 6.9783261258], [-7.7781745931, 7.7781745931], [-6.9783261258, 8.5031149870], [-6.1112725632, 9.1461657353], [-5.1853641051, 9.7011339078], [-4.2095177560, 10.1626748576], [-3.1931314498, 10.5263436931], [-2.1459935422, 10.7886380844], [-1.0781885436, 10.9470319934], [-0.0000000000, 11.0000000000], [1.0781885436, 10.9470319934], [2.1459935422, 10.7886380844], [3.1931314498, 10.5263436931], [4.2095177560, 10.1626748576], [5.1853641051, 9.7011339078], [6.1112725632, 9.1461657353], [6.9783261258, 8.5031149870], [7.7781745931, 7.7781745931], [8.5031149870, 6.9783261258], [9.1461657353, 6.1112725632], [9.7011339078, 5.1853641051], [10.1626748576, 4.2095177560], [10.5263436931, 3.1931314498], [10.7886380844, 2.1459935422], [10.9470319934, 1.0781885436], [11.0000000000, 0.0000000000]]);
							}
						}
					}
				}
				translate(v = [0, 0, -1]) {
					cylinder($fn = 32, h = 6.9000000000, r = 9);
				}
				translate(v = [15, 0, -1]) {
					union() {
						cylinder($fn = 16, h = 6.9000000000, r = 1.7500000000);
						translate(v = [0, 0, 3]) {
							cylinder($fn = 16, h = 4.9000000000, r = 2.9500000000);
						}
					}
				}
				translate(v = [-15, 0, -1]) {
					union() {
						cylinder($fn = 16, h = 6.9000000000, r = 1.7500000000);
						translate(v = [0, 0, 3]) {
							cylinder($fn = 16, h = 4.9000000000, r = 2.9500000000);
						}
					}
				}
			}
		}
		union() {
			difference() {
				linear_extrude(height = 4.9000000000) {
					union() {
						difference() {
							polygon(points = [[0.1472030230, -13.9963863686], [-0.1472030230, -13.9963863686], [-1.2253915666, -13.9434183620], [-1.5183799670, -13.9145615233], [-2.5861849655, -13.7561676143], [-2.8749340819, -13.6987318440], [-3.9220719895, -13.4364374526], [-4.2038010100, -13.3509758886], [-5.2201873162, -12.9873070532], [-5.4921830363, -12.8746427370], [-6.4680293854, -12.4131017872], [-6.7276723377, -12.2743197378], [-7.6535807958, -11.7193515653], [-7.8983704767, -11.5557883298], [-8.7654240393, -10.9127375814], [-8.8278398849, -10.8651689353], [-17.9597020064, -3.7148222417], [-18.1248651118, -3.5756216694], [-18.2521137316, -3.4602902431], [-18.4602902431, -3.2521137316], [-18.5756216694, -3.1248651118], [-18.7623908878, -2.8972861608], [-18.8646944160, -2.7593458213], [-19.0282576515, -2.5145561404], [-19.1165480426, -2.3672525220], [-19.2553300920, -2.1076095697], [-19.3287570613, -1.9523612869], [-19.4414213774, -1.6803655668], [-19.4992777831, -1.5186677454], [-19.5847393471, -1.2369387249], [-19.6264680003, -1.0703486032], [-19.6839037706, -0.7815994869], [-19.7091028016, -0.6117214189], [-19.7379596403, -0.3187330186], [-19.7463863686, -0.1472030230], [-19.7463863686, 0.1472030230], [-19.7379596403, 0.3187330186], [-19.7091028016, 0.6117214189], [-19.6839037706, 0.7815994869], [-19.6264680003, 1.0703486032], [-19.5847393471, 1.2369387249], [-19.4992777831, 1.5186677454], [-19.4414213774, 1.6803655668], [-19.3287570613, 1.9523612869], [-19.2553300920, 2.1076095697], [-19.1165480426, 2.3672525220], [-19.0282576515, 2.5145561404], [-18.8646944160, 2.7593458213], [-18.7623908878, 2.8972861608], [-18.5756216694, 3.1248651118], [-18.4602902431, 3.2521137316], [-18.2521137316, 3.4602902431], [-18.1248651118, 3.5756216694], [-17.9597020064, 3.7148222417], [-8.8278398849, 10.8651689353], [-8.7654240393, 10.9127375814], [-7.8983704767, 11.5557883298], [-7.6535807958, 11.7193515653], [-6.7276723377, 12.2743197378], [-6.4680293854, 12.4131017872], [-5.4921830363, 12.8746427370], [-5.2201873162, 12.9873070532], [-4.2038010100, 13.3509758886], [-3.9220719895, 13.4364374526], [-2.8749340819, 13.6987318440], [-2.5861849655, 13.7561676143], [-1.5183799670, 13.9145615233], [-1.2253915666, 13.9434183620], [-0.1472030230, 13.9963863686], [0.1472030230, 13.9963863686], [1.2253915666, 13.9434183620], [1.5183799670, 13.9145615233], [2.5861849655, 13.7561676143], [2.8749340819, 13.6987318440], [3.9220719895, 13.4364374526], [4.2038010100, 13.3509758886], [5.2201873162, 12.9873070532], [5.4921830363, 12.8746427370], [6.4680293854, 12.4131017872], [6.7276723377, 12.2743197378], [7.6535807958, 11.7193515653], [7.8983704767, 11.5557883298], [8.7654240393, 10.9127375814], [8.8278398849, 10.8651689353], [17.9597020064, 3.7148222417], [18.1248651118, 3.5756216694], [18.2521137316, 3.4602902431], [18.4602902431, 3.2521137316], [18.5756216694, 3.1248651118], [18.7623908878, 2.8972861608], [18.8646944160, 2.7593458213], [19.0282576515, 2.5145561404], [19.1165480426, 2.3672525220], [19.2553300920, 2.1076095697], [19.3287570613, 1.9523612869], [19.4414213774, 1.6803655668], [19.4992777831, 1.5186677454], [19.5847393471, 1.2369387249], [19.6264680003, 1.0703486032], [19.6839037706, 0.7815994869], [19.7091028016, 0.6117214189], [19.7379596403, 0.3187330186], [19.7463863686, 0.1472030230], [19.7463863686, -0.1472030230], [19.7379596403, -0.3187330186], [19.7091028016, -0.6117214189], [19.6839037706, -0.7815994869], [19.6264680003, -1.0703486032], [19.5847393471, -1.2369387249], [19.4992777831, -1.5186677454], [19.4414213774, -1.6803655668], [19.3287570613, -1.9523612869], [19.2553300920, -2.1076095697], [19.1165480426, -2.3672525220], [19.0282576515, -2.5145561404], [18.8646944160, -2.7593458213], [18.7623908878, -2.8972861608], [18.5756216694, -3.1248651118], [18.4602902431, -3.2521137316], [18.2521137316, -3.4602902431], [18.1248651118, -3.5756216694], [17.9597020064, -3.7148222417], [8.8278398849, -10.8651689353], [8.7654240393, -10.9127375814], [7.8983704767, -11.5557883298], [7.6535807958, -11.7193515653], [6.7276723377, -12.2743197378], [6.4680293854, -12.4131017872], [5.4921830363, -12.8746427370], [5.2201873162, -12.9873070532], [4.2038010100, -13.3509758886], [3.9220719895, -13.4364374526], [2.8749340819, -13.6987318440], [2.5861849655, -13.7561676143], [1.5183799670, -13.9145615233], [1.2253915666, -13.9434183620], [0.1472030230, -13.9963863686]]);
						}
					}
				}
				translate(v = [0, 0, -1]) {
					linear_extrude(height = 3.1000000000) {
						union() {
							difference() {
								polygon(points = [[11.0000000000, 0.0000000000], [10.9470319934, -1.0781885436], [10.7886380844, -2.1459935422], [10.5263436931, -3.1931314498], [10.1626748576, -4.2095177560], [9.7011339078, -5.1853641051], [9.1461657353, -6.1112725632], [8.5031149870, -6.9783261258], [7.7781745931, -7.7781745931], [6.9783261258, -8.5031149870], [6.1112725632, -9.1461657353], [5.1853641051, -9.7011339078], [4.2095177560, -10.1626748576], [3.1931314498, -10.5263436931], [2.1459935422, -10.7886380844], [1.0781885436, -10.9470319934], [0.0000000000, -11.0000000000], [-1.0781885436, -10.9470319934], [-2.1459935422, -10.7886380844], [-3.1931314498, -10.5263436931], [-4.2095177560, -10.1626748576], [-5.1853641051, -9.7011339078], [-6.1112725632, -9.1461657353], [-6.9783261258, -8.5031149870], [-7.7781745931, -7.7781745931], [-8.5031149870, -6.9783261258], [-9.1461657353, -6.1112725632], [-9.7011339078, -5.1853641051], [-10.1626748576, -4.2095177560], [-10.5263436931, -3.1931314498], [-10.7886380844, -2.1459935422], [-10.9470319934, -1.0781885436], [-11.0000000000, -0.0000000000], [-10.9470319934, 1.0781885436], [-10.7886380844, 2.1459935422], [-10.5263436931, 3.1931314498], [-10.1626748576, 4.2095177560], [-9.7011339078, 5.1853641051], [-9.1461657353, 6.1112725632], [-8.5031149870, 6.9783261258], [-7.7781745931, 7.7781745931], [-6.9783261258, 8.5031149870], [-6.1112725632, 9.1461657353], [-5.1853641051, 9.7011339078], [-4.2095177560, 10.1626748576], [-3.1931314498, 10.5263436931], [-2.1459935422, 10.7886380844], [-1.0781885436, 10.9470319934], [-0.0000000000, 11.0000000000], [1.0781885436, 10.9470319934], [2.1459935422, 10.7886380844], [3.1931314498, 10.5263436931], [4.2095177560, 10.1626748576], [5.1853641051, 9.7011339078], [6.1112725632, 9.1461657353], [6.9783261258, 8.5031149870], [7.7781745931, 7.7781745931], [8.5031149870, 6.9783261258], [9.1461657353, 6.1112725632], [9.7011339078, 5.1853641051], [10.1626748576, 4.2095177560], [10.5263436931, 3.1931314498], [10.7886380844, 2.1459935422], [10.9470319934, 1.0781885436], [11.0000000000, 0.0000000000]]);
							}
						}
					}
				}
				translate(v = [0, 0, -1]) {
					cylinder($fn = 32, h = 6.9000000000, r = 9);
				}
				translate(v = [15, 0, -1]) {
					union() {
						cylinder($fn = 16, h = 6.9000000000, r = 1.7500000000);
						translate(v = [0, 0, 3]) {
							cylinder($fn = 16, h = 4.9000000000, r = 2.9500000000);
						}
					}
				}
				translate(v = [-15, 0, -1]) {
					union() {
						cylinder($fn = 16, h = 6.9000000000, r = 1.7500000000);
						translate(v = [0, 0, 3]) {
							cylinder($fn = 16, h = 4.9000000000, r = 2.9500000000);
						}
					}
				}
			}
		}
	}
}
